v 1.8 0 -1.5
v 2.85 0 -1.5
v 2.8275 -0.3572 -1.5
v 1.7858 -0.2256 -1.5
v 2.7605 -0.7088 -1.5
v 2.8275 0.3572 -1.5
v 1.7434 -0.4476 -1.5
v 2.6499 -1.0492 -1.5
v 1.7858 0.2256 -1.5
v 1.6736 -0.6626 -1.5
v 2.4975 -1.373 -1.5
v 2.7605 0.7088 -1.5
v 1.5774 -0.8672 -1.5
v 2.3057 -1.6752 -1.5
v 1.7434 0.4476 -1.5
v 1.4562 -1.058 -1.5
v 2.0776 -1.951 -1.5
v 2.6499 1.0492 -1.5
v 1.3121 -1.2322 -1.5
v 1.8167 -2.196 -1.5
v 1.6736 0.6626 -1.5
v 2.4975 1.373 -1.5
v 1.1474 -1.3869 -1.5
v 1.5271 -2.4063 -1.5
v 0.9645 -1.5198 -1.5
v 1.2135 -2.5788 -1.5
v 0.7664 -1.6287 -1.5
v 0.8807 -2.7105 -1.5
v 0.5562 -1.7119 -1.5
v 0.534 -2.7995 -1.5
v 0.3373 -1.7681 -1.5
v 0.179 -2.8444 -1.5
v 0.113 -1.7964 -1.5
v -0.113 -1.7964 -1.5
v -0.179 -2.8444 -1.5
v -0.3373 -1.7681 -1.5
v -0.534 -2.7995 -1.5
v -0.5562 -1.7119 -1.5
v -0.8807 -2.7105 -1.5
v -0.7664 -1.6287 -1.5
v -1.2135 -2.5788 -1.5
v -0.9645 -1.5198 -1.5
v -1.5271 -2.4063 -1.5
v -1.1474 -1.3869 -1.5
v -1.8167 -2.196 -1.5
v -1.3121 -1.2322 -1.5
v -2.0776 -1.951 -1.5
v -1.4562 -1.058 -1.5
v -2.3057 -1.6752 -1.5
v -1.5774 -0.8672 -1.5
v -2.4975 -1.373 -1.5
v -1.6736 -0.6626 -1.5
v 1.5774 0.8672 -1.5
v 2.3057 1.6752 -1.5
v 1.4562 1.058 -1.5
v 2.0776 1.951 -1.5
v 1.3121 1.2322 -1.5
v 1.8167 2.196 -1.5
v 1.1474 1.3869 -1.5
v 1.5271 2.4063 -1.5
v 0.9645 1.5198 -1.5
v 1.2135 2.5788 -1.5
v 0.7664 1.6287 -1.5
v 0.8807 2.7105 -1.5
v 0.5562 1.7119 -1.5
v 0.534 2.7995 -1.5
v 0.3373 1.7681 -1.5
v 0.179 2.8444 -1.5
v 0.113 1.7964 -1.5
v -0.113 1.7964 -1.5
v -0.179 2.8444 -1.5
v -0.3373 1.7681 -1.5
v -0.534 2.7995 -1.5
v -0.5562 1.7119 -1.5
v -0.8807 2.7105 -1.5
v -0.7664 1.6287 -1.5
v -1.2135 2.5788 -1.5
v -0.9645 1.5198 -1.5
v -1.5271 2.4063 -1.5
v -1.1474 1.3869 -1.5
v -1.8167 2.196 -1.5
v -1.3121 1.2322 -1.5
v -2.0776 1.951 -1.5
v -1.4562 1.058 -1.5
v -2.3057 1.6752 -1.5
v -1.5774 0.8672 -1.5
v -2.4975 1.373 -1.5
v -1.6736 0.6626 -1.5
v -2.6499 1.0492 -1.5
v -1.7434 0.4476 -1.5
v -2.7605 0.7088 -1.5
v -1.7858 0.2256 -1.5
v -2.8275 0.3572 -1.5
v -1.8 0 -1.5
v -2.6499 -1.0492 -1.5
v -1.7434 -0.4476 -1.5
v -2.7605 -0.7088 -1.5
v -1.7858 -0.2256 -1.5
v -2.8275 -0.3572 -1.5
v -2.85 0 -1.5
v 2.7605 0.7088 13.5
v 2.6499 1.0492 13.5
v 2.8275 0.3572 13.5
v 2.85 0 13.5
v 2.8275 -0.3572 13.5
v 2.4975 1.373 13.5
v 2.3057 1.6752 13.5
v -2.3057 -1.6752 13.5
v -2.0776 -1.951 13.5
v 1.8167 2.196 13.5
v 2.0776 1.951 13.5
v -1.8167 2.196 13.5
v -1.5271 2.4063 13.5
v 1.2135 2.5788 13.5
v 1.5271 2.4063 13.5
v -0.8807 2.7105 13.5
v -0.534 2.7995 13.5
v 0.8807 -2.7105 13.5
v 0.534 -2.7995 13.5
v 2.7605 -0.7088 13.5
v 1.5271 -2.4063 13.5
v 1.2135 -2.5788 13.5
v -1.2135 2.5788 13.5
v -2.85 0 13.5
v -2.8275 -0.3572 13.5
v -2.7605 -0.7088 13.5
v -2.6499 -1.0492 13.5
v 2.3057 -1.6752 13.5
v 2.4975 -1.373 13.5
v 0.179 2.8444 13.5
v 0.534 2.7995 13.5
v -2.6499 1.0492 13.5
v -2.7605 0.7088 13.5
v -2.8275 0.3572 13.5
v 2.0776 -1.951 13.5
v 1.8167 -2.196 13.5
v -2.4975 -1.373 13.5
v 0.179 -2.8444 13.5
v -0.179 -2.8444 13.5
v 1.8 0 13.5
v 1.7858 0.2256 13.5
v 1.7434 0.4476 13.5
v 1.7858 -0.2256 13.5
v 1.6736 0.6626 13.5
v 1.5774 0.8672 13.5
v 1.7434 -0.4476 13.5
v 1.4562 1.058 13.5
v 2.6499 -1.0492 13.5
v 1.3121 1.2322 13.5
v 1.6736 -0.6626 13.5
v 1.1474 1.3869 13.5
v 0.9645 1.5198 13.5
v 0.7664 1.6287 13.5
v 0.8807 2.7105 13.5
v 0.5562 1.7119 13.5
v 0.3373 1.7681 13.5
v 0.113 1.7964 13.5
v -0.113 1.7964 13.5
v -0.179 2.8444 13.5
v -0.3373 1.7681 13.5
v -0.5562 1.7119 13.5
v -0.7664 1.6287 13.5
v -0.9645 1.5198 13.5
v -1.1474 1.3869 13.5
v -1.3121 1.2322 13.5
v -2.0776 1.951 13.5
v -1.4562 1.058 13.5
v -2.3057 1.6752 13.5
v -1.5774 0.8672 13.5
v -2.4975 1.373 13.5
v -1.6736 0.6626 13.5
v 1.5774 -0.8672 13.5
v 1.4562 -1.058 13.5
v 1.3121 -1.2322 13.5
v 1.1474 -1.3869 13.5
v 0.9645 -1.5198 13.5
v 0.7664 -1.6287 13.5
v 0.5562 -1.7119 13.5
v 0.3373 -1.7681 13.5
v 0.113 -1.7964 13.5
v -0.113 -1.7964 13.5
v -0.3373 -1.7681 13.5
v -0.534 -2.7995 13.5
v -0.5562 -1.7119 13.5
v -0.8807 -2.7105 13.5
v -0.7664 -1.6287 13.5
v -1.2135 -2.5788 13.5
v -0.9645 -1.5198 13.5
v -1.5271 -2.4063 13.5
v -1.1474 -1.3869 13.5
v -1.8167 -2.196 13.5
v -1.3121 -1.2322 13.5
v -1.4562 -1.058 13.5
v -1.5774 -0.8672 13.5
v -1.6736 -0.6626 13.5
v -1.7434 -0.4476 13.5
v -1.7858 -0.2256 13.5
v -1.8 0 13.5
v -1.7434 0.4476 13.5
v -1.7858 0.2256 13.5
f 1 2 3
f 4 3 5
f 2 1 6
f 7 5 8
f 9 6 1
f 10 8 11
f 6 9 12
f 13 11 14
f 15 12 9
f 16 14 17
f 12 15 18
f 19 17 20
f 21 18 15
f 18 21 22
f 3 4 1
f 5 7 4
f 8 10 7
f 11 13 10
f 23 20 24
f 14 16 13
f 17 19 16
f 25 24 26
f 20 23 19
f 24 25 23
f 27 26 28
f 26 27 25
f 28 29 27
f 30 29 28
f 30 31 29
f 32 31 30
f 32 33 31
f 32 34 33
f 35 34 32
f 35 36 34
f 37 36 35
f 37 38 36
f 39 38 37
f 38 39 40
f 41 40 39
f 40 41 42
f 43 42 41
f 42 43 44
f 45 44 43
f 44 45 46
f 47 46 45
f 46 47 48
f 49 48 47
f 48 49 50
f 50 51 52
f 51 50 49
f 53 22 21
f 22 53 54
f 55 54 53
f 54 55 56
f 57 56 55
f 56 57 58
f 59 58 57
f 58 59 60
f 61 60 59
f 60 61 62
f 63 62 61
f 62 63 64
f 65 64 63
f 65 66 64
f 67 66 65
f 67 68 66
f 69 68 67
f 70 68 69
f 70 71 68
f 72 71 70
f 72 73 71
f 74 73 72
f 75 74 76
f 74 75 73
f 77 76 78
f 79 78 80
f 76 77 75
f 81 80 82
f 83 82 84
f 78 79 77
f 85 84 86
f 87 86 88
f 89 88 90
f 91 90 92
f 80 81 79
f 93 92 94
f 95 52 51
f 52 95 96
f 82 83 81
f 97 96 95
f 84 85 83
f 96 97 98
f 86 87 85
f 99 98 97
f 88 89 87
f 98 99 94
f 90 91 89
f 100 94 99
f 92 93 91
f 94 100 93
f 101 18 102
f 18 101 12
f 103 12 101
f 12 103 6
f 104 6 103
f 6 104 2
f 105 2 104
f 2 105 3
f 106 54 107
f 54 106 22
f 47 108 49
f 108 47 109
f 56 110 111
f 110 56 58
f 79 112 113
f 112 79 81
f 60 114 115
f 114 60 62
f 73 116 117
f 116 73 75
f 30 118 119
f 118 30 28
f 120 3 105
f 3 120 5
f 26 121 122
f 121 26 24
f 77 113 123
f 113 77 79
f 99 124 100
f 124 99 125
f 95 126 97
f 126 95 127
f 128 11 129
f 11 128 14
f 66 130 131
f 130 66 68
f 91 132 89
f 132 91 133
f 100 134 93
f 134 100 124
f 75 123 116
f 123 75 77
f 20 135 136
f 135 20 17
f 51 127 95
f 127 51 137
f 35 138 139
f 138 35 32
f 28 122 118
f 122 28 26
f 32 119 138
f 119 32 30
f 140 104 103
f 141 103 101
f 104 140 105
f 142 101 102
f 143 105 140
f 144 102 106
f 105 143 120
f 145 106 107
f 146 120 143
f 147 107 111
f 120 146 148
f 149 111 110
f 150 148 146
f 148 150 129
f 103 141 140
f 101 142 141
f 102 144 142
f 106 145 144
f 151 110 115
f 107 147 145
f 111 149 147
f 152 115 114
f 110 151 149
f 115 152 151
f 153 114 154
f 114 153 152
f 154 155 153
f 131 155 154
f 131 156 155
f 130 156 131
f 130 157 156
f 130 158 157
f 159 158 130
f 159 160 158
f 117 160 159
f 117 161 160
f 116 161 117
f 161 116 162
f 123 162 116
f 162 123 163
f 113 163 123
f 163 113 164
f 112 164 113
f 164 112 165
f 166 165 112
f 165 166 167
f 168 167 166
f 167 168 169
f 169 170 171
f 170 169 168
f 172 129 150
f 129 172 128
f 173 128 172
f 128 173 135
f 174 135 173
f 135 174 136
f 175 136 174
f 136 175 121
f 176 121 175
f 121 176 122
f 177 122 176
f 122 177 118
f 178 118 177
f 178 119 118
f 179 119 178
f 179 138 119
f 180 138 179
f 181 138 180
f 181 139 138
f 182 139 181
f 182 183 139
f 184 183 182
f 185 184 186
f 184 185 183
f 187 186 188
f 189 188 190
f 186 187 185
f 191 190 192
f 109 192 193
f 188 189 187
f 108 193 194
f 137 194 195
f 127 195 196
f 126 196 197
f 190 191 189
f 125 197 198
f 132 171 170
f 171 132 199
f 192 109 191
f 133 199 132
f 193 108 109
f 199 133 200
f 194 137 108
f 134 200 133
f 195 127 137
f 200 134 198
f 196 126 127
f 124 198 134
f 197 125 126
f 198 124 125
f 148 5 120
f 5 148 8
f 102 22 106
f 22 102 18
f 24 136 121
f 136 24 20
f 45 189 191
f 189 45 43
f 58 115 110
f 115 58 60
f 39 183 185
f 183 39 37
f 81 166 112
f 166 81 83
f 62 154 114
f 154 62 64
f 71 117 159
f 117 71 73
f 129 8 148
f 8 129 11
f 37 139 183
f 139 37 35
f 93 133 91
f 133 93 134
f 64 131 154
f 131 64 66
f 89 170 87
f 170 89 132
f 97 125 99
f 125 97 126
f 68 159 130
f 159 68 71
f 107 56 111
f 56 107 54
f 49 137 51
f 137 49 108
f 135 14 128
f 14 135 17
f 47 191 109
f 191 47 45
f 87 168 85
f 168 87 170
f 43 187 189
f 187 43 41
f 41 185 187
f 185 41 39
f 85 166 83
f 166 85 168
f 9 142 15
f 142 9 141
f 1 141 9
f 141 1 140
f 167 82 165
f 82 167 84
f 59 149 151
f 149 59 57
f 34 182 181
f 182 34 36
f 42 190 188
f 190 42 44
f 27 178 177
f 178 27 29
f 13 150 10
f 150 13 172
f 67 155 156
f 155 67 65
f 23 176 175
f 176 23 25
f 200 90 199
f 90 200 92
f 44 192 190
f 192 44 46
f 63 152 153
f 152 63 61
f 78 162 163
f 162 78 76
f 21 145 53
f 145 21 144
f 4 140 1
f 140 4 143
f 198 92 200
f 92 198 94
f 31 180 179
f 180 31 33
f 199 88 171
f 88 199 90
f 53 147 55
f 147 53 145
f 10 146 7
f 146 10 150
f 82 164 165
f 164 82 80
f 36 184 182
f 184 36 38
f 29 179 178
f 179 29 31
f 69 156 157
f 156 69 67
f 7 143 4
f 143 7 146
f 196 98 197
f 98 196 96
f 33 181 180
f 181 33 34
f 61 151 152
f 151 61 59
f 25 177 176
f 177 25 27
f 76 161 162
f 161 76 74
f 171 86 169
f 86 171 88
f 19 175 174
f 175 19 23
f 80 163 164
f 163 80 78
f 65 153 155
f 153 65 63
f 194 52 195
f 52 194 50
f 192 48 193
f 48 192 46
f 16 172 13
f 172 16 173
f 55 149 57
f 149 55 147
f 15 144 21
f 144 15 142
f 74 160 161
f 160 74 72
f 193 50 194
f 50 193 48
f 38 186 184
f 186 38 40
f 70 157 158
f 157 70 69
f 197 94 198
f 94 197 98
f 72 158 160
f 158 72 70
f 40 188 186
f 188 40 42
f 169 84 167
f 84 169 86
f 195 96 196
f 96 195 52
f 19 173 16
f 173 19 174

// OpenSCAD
$fn = 50;


difference() {
	union() {
		translate(v = [0, 0, -1.5000000000]) {
			cylinder(h = 3, r = 1.0000000000);
		}
		translate(v = [0, 0, -1.5000000000]) {
			cylinder(h = 15, r = 2.8500000000);
		}
	}
	union() {
		translate(v = [0, 0, -100.0000000000]) {
			cylinder(h = 200, r = 1.8000000000);
		}
	}
}
